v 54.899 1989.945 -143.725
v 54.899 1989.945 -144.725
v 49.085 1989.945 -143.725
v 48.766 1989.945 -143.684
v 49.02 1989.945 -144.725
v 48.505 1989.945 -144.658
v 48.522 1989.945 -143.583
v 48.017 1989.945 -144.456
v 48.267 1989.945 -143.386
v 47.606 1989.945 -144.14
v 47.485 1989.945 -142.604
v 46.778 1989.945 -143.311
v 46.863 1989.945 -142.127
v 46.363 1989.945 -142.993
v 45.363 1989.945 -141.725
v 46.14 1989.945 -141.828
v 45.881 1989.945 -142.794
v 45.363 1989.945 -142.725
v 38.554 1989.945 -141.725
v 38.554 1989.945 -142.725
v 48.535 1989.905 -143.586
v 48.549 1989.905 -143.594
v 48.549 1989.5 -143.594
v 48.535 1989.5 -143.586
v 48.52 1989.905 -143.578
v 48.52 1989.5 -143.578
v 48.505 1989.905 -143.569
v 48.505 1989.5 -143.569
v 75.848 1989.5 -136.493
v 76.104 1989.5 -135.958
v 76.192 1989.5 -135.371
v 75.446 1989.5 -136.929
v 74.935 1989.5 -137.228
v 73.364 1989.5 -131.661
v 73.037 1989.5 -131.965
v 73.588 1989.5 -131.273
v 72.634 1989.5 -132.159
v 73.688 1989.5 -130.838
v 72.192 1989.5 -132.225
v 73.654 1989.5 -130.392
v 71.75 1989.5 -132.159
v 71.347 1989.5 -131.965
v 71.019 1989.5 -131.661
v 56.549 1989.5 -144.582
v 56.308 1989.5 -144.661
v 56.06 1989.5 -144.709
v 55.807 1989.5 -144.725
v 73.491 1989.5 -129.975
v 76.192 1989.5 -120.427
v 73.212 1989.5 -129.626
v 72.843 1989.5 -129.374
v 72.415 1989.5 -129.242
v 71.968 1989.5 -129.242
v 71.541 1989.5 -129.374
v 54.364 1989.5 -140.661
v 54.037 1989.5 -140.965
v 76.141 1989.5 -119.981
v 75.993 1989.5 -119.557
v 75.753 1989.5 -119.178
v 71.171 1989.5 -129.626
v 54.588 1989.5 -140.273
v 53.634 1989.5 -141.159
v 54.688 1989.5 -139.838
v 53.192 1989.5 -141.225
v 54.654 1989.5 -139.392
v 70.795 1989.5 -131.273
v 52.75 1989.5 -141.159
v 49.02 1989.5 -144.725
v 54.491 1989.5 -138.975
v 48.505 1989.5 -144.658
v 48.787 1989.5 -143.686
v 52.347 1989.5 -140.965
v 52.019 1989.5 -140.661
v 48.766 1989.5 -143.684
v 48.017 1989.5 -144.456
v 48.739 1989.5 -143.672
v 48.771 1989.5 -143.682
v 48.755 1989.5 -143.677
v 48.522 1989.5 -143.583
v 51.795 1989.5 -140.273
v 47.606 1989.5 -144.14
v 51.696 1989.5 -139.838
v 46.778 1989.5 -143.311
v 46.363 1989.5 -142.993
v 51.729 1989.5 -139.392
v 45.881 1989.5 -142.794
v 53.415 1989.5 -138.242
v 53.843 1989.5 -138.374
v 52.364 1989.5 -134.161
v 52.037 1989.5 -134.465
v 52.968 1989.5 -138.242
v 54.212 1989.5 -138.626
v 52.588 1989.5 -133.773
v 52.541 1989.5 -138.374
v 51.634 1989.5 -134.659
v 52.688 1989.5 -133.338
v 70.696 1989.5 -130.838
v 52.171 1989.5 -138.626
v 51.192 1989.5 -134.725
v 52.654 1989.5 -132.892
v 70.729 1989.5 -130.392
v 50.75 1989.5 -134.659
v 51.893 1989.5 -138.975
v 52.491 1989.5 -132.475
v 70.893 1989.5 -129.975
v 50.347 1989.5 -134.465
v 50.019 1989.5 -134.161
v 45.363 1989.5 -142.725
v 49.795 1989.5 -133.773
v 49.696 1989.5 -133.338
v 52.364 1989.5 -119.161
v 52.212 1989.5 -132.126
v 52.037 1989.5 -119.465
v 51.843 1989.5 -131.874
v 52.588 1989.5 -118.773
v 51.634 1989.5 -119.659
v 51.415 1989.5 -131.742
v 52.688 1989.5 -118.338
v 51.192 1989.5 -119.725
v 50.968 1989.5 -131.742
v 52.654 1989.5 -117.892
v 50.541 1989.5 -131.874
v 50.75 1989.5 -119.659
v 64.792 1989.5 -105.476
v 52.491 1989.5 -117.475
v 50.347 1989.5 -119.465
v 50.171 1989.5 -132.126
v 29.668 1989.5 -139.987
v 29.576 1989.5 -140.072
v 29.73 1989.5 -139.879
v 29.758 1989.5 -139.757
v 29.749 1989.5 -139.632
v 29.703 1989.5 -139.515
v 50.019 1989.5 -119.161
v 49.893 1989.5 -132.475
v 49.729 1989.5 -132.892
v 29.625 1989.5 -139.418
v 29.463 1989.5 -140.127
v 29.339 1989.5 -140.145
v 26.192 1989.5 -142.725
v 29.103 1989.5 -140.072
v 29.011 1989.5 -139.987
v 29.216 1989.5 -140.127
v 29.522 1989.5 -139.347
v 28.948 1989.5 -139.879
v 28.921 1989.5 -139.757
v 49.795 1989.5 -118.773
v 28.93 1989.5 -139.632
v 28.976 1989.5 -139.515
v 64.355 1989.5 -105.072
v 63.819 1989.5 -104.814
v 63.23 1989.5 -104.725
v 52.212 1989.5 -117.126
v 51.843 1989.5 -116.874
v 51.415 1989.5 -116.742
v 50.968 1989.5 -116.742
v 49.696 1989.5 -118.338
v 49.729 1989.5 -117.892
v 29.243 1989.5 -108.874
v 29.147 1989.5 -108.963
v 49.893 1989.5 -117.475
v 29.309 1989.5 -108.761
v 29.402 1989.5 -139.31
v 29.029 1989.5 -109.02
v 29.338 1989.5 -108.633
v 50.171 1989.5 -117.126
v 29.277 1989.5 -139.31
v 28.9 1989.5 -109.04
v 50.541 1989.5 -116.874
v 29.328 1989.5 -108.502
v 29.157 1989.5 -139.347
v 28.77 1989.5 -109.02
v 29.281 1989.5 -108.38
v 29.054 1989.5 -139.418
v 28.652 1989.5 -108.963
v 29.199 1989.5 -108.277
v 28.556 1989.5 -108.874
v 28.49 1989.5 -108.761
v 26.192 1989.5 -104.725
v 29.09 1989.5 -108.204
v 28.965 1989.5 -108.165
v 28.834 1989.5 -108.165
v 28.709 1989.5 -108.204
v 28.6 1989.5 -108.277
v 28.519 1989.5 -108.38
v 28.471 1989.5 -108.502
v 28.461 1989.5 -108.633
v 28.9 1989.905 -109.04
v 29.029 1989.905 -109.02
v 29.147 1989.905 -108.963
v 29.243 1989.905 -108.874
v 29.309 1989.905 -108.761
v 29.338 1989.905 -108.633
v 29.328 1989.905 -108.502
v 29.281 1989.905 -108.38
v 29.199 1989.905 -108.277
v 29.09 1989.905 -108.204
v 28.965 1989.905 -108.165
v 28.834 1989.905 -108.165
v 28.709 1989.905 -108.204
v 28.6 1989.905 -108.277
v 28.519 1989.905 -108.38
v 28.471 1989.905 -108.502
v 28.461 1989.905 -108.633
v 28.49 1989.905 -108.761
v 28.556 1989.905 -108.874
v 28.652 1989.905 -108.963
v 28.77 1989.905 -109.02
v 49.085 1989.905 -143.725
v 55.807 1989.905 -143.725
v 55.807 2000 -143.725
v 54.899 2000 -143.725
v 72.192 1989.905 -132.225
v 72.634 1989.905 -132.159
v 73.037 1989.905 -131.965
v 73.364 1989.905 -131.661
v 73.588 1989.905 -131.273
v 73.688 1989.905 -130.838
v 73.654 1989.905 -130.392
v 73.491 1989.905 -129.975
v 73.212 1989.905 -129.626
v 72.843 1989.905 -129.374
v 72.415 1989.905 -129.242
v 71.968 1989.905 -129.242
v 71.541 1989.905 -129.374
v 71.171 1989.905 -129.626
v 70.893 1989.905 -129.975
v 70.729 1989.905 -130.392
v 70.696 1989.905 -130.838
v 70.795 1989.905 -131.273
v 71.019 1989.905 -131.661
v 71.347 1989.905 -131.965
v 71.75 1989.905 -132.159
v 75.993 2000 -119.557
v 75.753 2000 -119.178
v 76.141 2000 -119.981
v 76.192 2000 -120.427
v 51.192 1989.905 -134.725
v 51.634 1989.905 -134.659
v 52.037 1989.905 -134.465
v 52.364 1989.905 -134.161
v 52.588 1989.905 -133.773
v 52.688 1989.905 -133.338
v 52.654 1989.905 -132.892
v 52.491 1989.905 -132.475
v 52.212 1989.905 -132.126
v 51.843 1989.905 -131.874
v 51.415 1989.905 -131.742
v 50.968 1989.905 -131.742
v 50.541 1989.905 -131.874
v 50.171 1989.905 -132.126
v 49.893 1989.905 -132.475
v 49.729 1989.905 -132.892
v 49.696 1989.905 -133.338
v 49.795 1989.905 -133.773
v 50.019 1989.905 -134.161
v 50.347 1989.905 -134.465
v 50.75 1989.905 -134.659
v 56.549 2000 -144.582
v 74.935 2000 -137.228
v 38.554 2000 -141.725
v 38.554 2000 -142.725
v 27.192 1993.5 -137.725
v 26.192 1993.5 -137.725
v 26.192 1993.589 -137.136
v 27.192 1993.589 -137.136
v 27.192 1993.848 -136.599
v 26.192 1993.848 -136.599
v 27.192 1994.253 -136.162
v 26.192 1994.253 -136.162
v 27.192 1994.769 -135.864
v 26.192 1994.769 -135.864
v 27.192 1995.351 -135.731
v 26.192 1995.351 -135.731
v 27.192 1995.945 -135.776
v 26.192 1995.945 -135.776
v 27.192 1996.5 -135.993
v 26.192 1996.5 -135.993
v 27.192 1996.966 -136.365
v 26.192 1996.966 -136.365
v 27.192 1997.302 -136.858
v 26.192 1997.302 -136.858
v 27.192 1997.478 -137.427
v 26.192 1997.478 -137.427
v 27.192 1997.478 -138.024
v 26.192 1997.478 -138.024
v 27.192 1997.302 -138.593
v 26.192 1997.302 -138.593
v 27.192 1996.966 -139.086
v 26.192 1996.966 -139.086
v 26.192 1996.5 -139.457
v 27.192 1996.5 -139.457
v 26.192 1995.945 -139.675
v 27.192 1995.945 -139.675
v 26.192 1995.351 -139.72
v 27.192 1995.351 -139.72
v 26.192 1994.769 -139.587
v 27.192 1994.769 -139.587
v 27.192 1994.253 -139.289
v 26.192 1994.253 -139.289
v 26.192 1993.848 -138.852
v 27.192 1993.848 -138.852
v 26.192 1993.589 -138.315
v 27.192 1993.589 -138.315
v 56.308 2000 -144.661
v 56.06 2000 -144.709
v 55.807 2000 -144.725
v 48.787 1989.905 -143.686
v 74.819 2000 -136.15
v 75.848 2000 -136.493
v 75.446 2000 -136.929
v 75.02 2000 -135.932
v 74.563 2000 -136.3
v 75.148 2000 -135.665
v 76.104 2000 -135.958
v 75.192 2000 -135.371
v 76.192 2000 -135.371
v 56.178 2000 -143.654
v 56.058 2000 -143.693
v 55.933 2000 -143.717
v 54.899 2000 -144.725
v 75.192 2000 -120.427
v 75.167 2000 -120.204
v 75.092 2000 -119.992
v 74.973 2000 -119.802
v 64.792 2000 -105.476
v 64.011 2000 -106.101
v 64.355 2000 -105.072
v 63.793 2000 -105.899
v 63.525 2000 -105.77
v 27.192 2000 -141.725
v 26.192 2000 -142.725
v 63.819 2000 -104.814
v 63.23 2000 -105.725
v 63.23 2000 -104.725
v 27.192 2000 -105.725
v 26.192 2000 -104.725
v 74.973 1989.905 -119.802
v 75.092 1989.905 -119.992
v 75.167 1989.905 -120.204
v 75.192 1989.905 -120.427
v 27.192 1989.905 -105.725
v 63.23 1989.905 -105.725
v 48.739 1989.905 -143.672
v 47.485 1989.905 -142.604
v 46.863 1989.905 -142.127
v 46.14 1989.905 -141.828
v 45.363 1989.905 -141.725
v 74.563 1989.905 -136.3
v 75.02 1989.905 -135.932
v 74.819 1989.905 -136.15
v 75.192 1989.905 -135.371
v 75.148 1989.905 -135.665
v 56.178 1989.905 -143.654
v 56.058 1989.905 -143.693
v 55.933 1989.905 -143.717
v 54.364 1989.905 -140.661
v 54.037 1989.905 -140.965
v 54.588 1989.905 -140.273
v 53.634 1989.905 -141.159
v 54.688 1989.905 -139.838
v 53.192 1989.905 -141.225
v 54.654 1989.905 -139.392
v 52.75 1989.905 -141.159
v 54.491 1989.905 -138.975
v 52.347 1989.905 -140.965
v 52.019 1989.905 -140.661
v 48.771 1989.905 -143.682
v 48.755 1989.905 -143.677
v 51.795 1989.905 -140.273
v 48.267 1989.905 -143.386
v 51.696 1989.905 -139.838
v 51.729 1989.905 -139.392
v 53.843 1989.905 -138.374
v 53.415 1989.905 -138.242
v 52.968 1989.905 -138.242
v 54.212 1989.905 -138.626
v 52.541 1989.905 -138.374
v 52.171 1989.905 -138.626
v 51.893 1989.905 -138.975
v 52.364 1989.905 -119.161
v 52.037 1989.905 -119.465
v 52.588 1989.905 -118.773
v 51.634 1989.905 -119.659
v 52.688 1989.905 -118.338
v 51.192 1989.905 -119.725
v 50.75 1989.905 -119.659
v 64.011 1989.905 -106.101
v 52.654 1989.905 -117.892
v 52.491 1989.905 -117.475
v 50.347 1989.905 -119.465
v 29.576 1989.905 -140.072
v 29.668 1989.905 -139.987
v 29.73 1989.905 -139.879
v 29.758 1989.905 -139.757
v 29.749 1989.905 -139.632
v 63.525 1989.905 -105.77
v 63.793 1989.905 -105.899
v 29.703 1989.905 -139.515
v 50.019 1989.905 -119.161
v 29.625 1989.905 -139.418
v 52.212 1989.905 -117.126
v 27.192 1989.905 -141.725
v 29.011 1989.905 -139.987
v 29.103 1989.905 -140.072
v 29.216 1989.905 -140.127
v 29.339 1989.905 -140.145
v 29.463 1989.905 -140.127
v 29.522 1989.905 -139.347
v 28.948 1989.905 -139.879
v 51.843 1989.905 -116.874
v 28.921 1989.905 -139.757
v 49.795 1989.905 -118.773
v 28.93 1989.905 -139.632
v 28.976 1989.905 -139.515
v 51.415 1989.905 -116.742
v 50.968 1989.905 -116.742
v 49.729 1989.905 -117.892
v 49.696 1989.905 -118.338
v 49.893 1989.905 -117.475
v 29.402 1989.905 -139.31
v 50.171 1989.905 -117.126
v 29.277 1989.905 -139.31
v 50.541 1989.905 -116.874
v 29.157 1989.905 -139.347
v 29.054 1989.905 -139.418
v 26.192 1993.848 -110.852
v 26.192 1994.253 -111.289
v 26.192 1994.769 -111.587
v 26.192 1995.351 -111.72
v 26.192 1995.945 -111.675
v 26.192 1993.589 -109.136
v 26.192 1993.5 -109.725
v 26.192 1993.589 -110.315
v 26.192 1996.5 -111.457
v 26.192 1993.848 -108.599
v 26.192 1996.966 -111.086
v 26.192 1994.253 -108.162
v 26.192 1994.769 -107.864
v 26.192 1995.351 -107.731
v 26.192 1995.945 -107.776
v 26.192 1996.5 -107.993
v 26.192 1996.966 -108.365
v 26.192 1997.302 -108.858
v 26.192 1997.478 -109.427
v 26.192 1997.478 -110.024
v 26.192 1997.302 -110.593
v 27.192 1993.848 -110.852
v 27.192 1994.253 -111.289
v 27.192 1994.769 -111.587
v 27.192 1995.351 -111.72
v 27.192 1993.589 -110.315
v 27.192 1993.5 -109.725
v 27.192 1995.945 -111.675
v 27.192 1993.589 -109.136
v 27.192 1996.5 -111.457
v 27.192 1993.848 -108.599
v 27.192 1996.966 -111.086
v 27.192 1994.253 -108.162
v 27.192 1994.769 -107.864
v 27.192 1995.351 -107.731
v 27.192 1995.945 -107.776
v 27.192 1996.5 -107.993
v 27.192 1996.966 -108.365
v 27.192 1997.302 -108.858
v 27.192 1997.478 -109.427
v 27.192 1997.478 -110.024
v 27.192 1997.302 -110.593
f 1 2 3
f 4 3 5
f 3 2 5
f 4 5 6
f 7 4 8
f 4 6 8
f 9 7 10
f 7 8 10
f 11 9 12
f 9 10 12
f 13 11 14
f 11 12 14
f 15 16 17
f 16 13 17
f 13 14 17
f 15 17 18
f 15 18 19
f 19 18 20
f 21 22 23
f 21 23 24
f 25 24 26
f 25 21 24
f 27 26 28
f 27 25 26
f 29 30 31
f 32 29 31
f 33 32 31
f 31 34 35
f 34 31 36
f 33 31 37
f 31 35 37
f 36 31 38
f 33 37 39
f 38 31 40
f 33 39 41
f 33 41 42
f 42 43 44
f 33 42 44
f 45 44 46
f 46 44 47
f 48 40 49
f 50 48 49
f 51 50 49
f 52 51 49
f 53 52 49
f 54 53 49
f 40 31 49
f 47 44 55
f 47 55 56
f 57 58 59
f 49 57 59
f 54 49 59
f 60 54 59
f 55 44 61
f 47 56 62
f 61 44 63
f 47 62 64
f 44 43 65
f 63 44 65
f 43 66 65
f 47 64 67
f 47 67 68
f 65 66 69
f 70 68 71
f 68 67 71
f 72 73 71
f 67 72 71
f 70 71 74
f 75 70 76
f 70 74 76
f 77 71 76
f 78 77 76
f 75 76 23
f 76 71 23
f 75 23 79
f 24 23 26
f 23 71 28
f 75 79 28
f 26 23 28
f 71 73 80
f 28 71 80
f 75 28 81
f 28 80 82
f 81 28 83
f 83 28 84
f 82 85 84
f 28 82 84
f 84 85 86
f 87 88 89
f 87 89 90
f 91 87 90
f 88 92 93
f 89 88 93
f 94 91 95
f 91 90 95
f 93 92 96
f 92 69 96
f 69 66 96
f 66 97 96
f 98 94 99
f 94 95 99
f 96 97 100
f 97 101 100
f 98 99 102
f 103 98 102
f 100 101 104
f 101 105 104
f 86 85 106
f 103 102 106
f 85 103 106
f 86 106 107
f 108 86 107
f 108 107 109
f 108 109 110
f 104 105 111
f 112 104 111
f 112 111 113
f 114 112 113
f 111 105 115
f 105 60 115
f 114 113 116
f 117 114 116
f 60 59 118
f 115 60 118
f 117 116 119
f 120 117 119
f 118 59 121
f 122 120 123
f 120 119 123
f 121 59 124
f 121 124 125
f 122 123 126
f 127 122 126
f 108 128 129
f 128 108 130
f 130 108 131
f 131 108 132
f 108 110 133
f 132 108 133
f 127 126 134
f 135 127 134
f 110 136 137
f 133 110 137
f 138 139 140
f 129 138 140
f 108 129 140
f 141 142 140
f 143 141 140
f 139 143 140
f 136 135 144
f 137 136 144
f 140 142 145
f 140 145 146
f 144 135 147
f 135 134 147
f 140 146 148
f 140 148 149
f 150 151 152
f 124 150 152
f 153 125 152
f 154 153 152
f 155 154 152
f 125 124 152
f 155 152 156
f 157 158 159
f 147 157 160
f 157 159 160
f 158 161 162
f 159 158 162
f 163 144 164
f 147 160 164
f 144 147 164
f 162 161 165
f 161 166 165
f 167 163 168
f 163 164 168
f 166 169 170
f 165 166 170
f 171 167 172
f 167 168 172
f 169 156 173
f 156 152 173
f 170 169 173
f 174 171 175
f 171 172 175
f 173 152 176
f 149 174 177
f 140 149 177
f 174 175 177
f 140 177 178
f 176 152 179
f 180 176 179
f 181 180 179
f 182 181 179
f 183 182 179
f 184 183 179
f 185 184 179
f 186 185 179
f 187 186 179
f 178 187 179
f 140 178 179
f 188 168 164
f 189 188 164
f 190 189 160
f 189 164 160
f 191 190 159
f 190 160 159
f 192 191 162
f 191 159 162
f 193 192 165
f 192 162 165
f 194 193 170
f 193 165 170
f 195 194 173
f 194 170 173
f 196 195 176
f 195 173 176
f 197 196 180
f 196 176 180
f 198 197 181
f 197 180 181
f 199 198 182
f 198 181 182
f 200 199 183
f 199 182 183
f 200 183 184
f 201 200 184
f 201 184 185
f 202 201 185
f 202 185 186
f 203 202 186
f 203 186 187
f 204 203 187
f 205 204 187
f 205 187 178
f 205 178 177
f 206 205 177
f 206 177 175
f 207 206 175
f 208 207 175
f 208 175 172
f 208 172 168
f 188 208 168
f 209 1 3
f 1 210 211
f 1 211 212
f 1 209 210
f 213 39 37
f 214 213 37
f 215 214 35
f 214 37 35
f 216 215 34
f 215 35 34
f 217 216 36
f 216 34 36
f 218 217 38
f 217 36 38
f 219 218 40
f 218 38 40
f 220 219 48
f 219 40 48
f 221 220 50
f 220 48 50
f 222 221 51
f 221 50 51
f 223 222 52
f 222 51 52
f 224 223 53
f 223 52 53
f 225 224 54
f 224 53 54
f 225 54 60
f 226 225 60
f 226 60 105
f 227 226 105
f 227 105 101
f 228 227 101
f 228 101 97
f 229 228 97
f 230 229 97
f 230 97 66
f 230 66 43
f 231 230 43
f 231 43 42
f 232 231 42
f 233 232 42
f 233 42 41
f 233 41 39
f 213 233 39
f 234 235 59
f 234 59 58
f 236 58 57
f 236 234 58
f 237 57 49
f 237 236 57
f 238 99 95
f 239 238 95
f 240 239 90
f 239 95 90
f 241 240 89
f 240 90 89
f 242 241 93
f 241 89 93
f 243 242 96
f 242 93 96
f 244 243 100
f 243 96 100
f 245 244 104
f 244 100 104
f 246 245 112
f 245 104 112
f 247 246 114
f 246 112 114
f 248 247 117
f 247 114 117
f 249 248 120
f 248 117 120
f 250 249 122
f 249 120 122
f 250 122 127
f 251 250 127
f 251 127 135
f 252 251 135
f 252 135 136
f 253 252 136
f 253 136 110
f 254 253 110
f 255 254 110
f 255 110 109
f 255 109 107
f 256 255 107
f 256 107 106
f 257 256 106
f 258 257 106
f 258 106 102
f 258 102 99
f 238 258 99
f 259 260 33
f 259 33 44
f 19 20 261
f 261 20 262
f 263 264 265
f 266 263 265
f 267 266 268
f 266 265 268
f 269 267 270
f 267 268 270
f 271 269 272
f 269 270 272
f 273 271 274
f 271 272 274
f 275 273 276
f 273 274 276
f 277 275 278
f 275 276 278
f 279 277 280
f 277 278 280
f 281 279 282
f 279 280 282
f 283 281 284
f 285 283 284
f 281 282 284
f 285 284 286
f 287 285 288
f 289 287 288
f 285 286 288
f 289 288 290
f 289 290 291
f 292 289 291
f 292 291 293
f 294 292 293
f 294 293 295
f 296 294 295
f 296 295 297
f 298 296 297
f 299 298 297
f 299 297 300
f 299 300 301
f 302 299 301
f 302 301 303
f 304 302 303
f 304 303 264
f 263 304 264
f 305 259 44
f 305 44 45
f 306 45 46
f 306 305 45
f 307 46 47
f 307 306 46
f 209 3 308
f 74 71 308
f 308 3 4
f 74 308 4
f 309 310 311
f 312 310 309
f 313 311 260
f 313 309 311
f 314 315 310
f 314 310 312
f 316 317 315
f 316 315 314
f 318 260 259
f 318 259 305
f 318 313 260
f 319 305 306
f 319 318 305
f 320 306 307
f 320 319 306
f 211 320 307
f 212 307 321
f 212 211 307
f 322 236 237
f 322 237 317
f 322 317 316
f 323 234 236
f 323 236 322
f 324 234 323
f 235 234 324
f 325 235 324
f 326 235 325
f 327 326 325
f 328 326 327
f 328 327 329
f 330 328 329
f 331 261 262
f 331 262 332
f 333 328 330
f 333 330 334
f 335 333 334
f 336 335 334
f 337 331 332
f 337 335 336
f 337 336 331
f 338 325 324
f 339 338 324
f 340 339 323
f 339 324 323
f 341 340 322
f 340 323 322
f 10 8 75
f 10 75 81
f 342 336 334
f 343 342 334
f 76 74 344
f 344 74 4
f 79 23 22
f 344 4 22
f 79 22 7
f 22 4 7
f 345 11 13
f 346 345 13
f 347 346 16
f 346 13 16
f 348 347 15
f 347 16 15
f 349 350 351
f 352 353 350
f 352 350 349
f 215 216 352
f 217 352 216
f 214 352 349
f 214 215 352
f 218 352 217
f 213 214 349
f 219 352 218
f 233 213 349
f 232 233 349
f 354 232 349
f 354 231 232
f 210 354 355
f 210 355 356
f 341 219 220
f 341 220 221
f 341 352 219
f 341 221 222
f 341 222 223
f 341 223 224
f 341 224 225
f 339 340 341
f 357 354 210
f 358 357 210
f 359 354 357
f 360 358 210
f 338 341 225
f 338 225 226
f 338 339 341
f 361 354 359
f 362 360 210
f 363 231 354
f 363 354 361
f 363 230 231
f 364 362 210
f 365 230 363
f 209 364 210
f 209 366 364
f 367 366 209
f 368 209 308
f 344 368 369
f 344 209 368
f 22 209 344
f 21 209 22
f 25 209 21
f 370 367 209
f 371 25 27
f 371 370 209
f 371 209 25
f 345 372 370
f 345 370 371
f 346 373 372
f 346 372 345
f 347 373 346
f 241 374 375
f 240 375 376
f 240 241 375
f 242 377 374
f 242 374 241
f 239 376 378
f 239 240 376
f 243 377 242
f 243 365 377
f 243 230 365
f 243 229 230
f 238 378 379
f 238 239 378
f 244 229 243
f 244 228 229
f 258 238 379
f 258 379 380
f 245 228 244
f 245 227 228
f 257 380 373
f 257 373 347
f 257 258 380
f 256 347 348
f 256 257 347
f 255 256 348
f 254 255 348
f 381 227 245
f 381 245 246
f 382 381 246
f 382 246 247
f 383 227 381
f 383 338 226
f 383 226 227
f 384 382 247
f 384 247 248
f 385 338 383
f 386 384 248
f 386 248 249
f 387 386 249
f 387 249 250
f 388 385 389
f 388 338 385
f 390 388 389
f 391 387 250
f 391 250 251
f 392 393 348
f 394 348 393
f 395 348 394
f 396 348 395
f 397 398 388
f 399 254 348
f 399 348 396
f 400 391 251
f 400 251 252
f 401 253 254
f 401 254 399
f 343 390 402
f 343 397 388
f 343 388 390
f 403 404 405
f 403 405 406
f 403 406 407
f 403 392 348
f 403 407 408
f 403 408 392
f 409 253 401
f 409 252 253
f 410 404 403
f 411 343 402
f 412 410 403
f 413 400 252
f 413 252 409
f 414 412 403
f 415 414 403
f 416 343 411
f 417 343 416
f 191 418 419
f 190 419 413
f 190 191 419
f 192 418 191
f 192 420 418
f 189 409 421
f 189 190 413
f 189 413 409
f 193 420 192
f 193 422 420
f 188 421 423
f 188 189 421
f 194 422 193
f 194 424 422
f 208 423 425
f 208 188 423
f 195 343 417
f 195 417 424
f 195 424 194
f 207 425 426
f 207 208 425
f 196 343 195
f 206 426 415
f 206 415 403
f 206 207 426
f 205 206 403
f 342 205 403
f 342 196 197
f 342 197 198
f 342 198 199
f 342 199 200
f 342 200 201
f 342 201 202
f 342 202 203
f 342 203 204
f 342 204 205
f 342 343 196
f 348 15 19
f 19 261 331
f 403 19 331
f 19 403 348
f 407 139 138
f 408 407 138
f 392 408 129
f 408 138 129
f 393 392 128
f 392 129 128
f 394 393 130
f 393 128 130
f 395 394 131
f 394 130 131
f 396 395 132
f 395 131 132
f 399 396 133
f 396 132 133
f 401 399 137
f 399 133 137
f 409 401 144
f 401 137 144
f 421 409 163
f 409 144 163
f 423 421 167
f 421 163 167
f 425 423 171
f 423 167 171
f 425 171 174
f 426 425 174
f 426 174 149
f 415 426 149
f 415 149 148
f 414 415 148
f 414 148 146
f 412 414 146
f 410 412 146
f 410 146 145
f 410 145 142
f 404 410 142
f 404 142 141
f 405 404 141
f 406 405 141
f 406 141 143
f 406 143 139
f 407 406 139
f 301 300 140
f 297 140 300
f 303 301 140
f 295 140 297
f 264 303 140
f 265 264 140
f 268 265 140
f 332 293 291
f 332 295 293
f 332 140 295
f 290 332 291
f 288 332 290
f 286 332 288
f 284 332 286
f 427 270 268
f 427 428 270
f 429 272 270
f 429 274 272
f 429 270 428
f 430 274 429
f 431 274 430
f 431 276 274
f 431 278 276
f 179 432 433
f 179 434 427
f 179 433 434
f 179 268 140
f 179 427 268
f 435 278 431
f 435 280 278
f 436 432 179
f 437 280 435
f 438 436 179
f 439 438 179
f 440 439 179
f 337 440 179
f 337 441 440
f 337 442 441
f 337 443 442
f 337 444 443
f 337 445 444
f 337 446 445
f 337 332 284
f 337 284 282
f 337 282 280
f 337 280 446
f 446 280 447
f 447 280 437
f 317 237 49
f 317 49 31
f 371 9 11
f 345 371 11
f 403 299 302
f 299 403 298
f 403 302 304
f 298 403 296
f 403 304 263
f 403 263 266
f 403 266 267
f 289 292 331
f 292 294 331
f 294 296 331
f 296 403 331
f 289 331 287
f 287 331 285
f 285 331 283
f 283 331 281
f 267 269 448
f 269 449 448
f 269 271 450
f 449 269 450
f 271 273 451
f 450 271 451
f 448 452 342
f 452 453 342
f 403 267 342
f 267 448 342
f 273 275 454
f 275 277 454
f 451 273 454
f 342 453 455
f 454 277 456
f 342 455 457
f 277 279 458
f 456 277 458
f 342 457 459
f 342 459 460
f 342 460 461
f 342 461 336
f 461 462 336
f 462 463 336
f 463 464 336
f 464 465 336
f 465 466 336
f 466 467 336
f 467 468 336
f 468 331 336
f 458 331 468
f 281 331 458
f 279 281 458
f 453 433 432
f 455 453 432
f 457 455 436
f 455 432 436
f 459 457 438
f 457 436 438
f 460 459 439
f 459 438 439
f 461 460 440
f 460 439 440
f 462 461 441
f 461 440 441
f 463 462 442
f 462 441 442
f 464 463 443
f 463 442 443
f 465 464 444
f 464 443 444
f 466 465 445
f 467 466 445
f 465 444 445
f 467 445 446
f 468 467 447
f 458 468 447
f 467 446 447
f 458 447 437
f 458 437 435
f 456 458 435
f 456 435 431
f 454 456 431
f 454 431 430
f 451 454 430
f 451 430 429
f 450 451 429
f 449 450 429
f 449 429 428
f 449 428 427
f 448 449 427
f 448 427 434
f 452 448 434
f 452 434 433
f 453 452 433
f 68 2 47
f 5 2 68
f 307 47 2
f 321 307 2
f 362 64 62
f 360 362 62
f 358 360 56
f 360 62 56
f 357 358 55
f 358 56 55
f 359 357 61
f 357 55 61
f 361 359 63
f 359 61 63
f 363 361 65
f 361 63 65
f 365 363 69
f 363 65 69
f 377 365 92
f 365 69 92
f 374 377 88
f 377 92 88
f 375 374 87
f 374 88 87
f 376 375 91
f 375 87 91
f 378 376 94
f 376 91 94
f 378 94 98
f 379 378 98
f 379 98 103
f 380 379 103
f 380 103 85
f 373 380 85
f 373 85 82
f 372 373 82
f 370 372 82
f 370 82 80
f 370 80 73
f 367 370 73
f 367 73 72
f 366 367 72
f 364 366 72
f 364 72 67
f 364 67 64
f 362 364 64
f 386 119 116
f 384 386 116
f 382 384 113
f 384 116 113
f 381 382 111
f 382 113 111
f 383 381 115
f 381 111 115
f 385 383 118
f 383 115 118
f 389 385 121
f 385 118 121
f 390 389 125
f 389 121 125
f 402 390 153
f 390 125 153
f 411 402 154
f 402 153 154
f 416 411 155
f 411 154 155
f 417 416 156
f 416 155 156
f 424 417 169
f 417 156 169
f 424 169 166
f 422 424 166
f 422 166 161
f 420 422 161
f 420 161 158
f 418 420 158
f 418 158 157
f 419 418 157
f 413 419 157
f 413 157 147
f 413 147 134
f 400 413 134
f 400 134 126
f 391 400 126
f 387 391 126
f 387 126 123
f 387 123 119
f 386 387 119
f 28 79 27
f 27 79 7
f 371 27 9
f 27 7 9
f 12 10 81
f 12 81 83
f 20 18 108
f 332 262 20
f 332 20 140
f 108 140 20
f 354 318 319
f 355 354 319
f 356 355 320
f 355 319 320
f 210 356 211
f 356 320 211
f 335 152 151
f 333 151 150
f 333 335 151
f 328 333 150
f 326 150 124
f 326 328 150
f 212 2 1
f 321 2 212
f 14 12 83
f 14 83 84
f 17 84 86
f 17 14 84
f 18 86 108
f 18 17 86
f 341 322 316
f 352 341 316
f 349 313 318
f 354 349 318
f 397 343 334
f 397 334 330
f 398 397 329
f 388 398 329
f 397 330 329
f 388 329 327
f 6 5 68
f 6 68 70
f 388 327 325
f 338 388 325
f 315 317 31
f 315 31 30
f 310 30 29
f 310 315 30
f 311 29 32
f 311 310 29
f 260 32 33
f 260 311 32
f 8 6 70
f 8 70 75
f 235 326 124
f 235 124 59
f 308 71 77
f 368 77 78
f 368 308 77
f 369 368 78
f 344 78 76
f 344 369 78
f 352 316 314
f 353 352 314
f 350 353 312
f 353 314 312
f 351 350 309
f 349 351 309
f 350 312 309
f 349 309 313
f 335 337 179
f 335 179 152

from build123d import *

# Parameters (mm, degrees)
RESSALTO_EXTRUS_O1_DEPTH = 10.5
RESSALTO_EXTRUS_O2_START = -0.405481833
RESSALTO_EXTRUS_O2_DEPTH = 0.405481833
ESBO_O6_R                = 1.5
ESBO_O6_R_2              = 0.439880444
ESBO_O6_R_3              = 0.420000653
CORTE_EXTRUS_O1_DEPTH    = 10
ESBO_O7_R                = 2
CORTE_EXTRUS_O2_DEPTH    = 10
ESBO_O8_W                = 16.345048289
ESBO_O8_H                = 10.10072272
CORTE_EXTRUS_O3_DEPTH    = 6


with BuildPart() as part:
    # Esboço1 → Ressalto-extrusão1 (new body)
    with BuildSketch(Plane.XZ.offset(-2000)):
        with BuildLine():
            Line((26.191736717, -104.725419486), (63.230487022, -104.725419486))
            ThreePointArc((63.230487022, -104.725419486), (64.096864483, -104.922813013), (64.79222464, -105.476029391))
            Line((64.79222464, -105.476029391), (75.753474335, -119.17759151))
            ThreePointArc((75.753474335, -119.17759151), (76.078993355, -119.764967722), (76.191736717, -120.426981605))
            Line((76.191736717, -120.426981605), (76.191736717, -135.371353563))
            ThreePointArc((76.191736717, -135.371353563), (75.847871178, -136.492611182), (74.934518069, -137.228306945))
            Line((74.934518069, -137.228306945), (56.549353262, -144.582372868))
            ThreePointArc((56.549353262, -144.582372868), (56.184786952, -144.689332259), (55.806571909, -144.725419486))
            Line((55.806571909, -144.725419486), (49.020163841, -144.725419486))
            Line((49.020163841, -144.725419486), (48.505389373, -144.65803617))
            Line((48.505389373, -144.65803617), (48.017411303, -144.455878196))
            Line((48.017411303, -144.455878196), (47.605950279, -144.139633048))
            Line((47.605950279, -144.139633048), (46.777523154, -143.311205924))
            ThreePointArc((46.777523154, -143.311205924), (46.128676457, -142.877660421), (45.363309592, -142.725419486))
            Line((45.363309592, -142.725419486), (26.191736717, -142.725419486))
            Line((26.191736717, -142.725419486), (26.191736717, -104.725419486))
        make_face()
        with BuildLine():
            Line((48.266993092, -143.386462299), (47.484629935, -142.604099142))
            ThreePointArc((47.484629935, -142.604099142), (46.511359889, -141.953780888), (45.363309592, -141.725419486))
            Line((45.363309592, -141.725419486), (27.191736717, -141.725419486))
            Line((27.191736717, -141.725419486), (27.191736717, -105.725419486))
            Line((27.191736717, -105.725419486), (63.230487022, -105.725419486))
            ThreePointArc((63.230487022, -105.725419486), (63.663675752, -105.82411625), (64.011355831, -106.100724438))
            Line((64.011355831, -106.100724438), (74.972605526, -119.802286557))
            ThreePointArc((74.972605526, -119.802286557), (75.135365036, -120.095974663), (75.191736717, -120.426981605))
            Line((75.191736717, -120.426981605), (75.191736717, -135.371353563))
            ThreePointArc((75.191736717, -135.371353563), (75.019803947, -135.931982372), (74.563127393, -136.299830254))
            Line((74.563127393, -136.299830254), (56.177962586, -143.653896177))
            ThreePointArc((56.177962586, -143.653896177), (55.995679431, -143.707375873), (55.806571909, -143.725419486))
            Line((55.806571909, -143.725419486), (49.085335215, -143.725419486))
            Line((49.085335215, -143.725419486), (48.766120713, -143.683634718))
            Line((48.766120713, -143.683634718), (48.522121146, -143.582551368))
            Line((48.522121146, -143.582551368), (48.266993092, -143.386462299))
        make_face(mode=Mode.SUBTRACT)
    extrude(amount=RESSALTO_EXTRUS_O1_DEPTH)

    # Esboço5 → Ressalto-extrusão2 (add)
    with BuildSketch(Plane.XZ.offset(-1989.5).offset(RESSALTO_EXTRUS_O2_START)):
        with BuildLine():
            Line((27.191736717, -105.725419486), (63.230487022, -105.725419486))
            ThreePointArc((63.230487022, -105.725419486), (63.663675752, -105.82411625), (64.011355831, -106.100724438))
            Line((64.011355831, -106.100724438), (74.972605526, -119.802286557))
            ThreePointArc((74.972605526, -119.802286557), (75.135365036, -120.095974663), (75.191736717, -120.426981605))
            Line((75.191736717, -120.426981605), (75.191736717, -135.371353563))
            ThreePointArc((75.191736717, -135.371353563), (75.019803947, -135.931982372), (74.563127393, -136.299830254))
            Line((74.563127393, -136.299830254), (56.177962586, -143.653896177))
            ThreePointArc((56.177962586, -143.653896177), (55.995679431, -143.707375873), (55.806571909, -143.725419486))
            Line((55.806571909, -143.725419486), (49.085335215, -143.725419486))
            ThreePointArc((49.085335215, -143.725419486), (48.642453796, -143.637327588), (48.266993092, -143.386462299))
            Line((48.266993092, -143.386462299), (47.484629935, -142.604099142))
            ThreePointArc((47.484629935, -142.604099142), (46.511359889, -141.953780888), (45.363309592, -141.725419486))
            Line((45.363309592, -141.725419486), (27.191736717, -141.725419486))
            Line((27.191736717, -141.725419486), (27.191736717, -105.725419486))
        make_face()
    extrude(amount=RESSALTO_EXTRUS_O2_DEPTH)

    # Esboço6 → Corte-extrusão1 (cut)
    with BuildSketch(Plane.XZ.offset(-1989.5)):
        with Locations(Location((51.191736717, -118.225419486, 0), (0, 0, 270))):
            Circle(ESBO_O6_R)
        with Locations(Location((51.191736717, -133.225419486, 0), (0, 0, 270))):
            Circle(ESBO_O6_R)
        with Locations(Location((72.191736717, -130.725419486, 0), (0, 0, 270))):
            Circle(ESBO_O6_R)
        with Locations(Location((53.191736717, -139.725419486, 0), (0, 0, 270))):
            Circle(ESBO_O6_R)
        with Locations(Location((28.899554792, -108.599940214, 0), (0, 0, 270))):
            Circle(ESBO_O6_R_2)
        with Locations(Location((29.339435236, -139.725419486, 0), (0, 0, 270))):
            Circle(ESBO_O6_R_3)
    extrude(amount=-CORTE_EXTRUS_O1_DEPTH, mode=Mode.SUBTRACT)

    # Esboço7 → Corte-extrusão2 (cut)
    with BuildSketch(Plane.ZY.offset(-26.191736717)):
        with Locations(Location((-137.725419486, 1995.5, 0), (0, 0, 270))):
            Circle(ESBO_O7_R)
        with Locations(Location((-109.725419486, 1995.5, 0), (0, 0, 270))):
            Circle(ESBO_O7_R)
    extrude(amount=-CORTE_EXTRUS_O2_DEPTH, mode=Mode.SUBTRACT)

    # Esboço8 → Corte-extrusão3 (cut)
    with BuildSketch(Plane(origin=(0, 0, -144.725419486), x_dir=(-1, 0, 0), z_dir=(0, 0, -1))):
        with Locations((-46.726167809, 1994.995129696)):
            Rectangle(ESBO_O8_W, ESBO_O8_H)
    extrude(amount=-CORTE_EXTRUS_O3_DEPTH, mode=Mode.SUBTRACT)


solid = part.part
